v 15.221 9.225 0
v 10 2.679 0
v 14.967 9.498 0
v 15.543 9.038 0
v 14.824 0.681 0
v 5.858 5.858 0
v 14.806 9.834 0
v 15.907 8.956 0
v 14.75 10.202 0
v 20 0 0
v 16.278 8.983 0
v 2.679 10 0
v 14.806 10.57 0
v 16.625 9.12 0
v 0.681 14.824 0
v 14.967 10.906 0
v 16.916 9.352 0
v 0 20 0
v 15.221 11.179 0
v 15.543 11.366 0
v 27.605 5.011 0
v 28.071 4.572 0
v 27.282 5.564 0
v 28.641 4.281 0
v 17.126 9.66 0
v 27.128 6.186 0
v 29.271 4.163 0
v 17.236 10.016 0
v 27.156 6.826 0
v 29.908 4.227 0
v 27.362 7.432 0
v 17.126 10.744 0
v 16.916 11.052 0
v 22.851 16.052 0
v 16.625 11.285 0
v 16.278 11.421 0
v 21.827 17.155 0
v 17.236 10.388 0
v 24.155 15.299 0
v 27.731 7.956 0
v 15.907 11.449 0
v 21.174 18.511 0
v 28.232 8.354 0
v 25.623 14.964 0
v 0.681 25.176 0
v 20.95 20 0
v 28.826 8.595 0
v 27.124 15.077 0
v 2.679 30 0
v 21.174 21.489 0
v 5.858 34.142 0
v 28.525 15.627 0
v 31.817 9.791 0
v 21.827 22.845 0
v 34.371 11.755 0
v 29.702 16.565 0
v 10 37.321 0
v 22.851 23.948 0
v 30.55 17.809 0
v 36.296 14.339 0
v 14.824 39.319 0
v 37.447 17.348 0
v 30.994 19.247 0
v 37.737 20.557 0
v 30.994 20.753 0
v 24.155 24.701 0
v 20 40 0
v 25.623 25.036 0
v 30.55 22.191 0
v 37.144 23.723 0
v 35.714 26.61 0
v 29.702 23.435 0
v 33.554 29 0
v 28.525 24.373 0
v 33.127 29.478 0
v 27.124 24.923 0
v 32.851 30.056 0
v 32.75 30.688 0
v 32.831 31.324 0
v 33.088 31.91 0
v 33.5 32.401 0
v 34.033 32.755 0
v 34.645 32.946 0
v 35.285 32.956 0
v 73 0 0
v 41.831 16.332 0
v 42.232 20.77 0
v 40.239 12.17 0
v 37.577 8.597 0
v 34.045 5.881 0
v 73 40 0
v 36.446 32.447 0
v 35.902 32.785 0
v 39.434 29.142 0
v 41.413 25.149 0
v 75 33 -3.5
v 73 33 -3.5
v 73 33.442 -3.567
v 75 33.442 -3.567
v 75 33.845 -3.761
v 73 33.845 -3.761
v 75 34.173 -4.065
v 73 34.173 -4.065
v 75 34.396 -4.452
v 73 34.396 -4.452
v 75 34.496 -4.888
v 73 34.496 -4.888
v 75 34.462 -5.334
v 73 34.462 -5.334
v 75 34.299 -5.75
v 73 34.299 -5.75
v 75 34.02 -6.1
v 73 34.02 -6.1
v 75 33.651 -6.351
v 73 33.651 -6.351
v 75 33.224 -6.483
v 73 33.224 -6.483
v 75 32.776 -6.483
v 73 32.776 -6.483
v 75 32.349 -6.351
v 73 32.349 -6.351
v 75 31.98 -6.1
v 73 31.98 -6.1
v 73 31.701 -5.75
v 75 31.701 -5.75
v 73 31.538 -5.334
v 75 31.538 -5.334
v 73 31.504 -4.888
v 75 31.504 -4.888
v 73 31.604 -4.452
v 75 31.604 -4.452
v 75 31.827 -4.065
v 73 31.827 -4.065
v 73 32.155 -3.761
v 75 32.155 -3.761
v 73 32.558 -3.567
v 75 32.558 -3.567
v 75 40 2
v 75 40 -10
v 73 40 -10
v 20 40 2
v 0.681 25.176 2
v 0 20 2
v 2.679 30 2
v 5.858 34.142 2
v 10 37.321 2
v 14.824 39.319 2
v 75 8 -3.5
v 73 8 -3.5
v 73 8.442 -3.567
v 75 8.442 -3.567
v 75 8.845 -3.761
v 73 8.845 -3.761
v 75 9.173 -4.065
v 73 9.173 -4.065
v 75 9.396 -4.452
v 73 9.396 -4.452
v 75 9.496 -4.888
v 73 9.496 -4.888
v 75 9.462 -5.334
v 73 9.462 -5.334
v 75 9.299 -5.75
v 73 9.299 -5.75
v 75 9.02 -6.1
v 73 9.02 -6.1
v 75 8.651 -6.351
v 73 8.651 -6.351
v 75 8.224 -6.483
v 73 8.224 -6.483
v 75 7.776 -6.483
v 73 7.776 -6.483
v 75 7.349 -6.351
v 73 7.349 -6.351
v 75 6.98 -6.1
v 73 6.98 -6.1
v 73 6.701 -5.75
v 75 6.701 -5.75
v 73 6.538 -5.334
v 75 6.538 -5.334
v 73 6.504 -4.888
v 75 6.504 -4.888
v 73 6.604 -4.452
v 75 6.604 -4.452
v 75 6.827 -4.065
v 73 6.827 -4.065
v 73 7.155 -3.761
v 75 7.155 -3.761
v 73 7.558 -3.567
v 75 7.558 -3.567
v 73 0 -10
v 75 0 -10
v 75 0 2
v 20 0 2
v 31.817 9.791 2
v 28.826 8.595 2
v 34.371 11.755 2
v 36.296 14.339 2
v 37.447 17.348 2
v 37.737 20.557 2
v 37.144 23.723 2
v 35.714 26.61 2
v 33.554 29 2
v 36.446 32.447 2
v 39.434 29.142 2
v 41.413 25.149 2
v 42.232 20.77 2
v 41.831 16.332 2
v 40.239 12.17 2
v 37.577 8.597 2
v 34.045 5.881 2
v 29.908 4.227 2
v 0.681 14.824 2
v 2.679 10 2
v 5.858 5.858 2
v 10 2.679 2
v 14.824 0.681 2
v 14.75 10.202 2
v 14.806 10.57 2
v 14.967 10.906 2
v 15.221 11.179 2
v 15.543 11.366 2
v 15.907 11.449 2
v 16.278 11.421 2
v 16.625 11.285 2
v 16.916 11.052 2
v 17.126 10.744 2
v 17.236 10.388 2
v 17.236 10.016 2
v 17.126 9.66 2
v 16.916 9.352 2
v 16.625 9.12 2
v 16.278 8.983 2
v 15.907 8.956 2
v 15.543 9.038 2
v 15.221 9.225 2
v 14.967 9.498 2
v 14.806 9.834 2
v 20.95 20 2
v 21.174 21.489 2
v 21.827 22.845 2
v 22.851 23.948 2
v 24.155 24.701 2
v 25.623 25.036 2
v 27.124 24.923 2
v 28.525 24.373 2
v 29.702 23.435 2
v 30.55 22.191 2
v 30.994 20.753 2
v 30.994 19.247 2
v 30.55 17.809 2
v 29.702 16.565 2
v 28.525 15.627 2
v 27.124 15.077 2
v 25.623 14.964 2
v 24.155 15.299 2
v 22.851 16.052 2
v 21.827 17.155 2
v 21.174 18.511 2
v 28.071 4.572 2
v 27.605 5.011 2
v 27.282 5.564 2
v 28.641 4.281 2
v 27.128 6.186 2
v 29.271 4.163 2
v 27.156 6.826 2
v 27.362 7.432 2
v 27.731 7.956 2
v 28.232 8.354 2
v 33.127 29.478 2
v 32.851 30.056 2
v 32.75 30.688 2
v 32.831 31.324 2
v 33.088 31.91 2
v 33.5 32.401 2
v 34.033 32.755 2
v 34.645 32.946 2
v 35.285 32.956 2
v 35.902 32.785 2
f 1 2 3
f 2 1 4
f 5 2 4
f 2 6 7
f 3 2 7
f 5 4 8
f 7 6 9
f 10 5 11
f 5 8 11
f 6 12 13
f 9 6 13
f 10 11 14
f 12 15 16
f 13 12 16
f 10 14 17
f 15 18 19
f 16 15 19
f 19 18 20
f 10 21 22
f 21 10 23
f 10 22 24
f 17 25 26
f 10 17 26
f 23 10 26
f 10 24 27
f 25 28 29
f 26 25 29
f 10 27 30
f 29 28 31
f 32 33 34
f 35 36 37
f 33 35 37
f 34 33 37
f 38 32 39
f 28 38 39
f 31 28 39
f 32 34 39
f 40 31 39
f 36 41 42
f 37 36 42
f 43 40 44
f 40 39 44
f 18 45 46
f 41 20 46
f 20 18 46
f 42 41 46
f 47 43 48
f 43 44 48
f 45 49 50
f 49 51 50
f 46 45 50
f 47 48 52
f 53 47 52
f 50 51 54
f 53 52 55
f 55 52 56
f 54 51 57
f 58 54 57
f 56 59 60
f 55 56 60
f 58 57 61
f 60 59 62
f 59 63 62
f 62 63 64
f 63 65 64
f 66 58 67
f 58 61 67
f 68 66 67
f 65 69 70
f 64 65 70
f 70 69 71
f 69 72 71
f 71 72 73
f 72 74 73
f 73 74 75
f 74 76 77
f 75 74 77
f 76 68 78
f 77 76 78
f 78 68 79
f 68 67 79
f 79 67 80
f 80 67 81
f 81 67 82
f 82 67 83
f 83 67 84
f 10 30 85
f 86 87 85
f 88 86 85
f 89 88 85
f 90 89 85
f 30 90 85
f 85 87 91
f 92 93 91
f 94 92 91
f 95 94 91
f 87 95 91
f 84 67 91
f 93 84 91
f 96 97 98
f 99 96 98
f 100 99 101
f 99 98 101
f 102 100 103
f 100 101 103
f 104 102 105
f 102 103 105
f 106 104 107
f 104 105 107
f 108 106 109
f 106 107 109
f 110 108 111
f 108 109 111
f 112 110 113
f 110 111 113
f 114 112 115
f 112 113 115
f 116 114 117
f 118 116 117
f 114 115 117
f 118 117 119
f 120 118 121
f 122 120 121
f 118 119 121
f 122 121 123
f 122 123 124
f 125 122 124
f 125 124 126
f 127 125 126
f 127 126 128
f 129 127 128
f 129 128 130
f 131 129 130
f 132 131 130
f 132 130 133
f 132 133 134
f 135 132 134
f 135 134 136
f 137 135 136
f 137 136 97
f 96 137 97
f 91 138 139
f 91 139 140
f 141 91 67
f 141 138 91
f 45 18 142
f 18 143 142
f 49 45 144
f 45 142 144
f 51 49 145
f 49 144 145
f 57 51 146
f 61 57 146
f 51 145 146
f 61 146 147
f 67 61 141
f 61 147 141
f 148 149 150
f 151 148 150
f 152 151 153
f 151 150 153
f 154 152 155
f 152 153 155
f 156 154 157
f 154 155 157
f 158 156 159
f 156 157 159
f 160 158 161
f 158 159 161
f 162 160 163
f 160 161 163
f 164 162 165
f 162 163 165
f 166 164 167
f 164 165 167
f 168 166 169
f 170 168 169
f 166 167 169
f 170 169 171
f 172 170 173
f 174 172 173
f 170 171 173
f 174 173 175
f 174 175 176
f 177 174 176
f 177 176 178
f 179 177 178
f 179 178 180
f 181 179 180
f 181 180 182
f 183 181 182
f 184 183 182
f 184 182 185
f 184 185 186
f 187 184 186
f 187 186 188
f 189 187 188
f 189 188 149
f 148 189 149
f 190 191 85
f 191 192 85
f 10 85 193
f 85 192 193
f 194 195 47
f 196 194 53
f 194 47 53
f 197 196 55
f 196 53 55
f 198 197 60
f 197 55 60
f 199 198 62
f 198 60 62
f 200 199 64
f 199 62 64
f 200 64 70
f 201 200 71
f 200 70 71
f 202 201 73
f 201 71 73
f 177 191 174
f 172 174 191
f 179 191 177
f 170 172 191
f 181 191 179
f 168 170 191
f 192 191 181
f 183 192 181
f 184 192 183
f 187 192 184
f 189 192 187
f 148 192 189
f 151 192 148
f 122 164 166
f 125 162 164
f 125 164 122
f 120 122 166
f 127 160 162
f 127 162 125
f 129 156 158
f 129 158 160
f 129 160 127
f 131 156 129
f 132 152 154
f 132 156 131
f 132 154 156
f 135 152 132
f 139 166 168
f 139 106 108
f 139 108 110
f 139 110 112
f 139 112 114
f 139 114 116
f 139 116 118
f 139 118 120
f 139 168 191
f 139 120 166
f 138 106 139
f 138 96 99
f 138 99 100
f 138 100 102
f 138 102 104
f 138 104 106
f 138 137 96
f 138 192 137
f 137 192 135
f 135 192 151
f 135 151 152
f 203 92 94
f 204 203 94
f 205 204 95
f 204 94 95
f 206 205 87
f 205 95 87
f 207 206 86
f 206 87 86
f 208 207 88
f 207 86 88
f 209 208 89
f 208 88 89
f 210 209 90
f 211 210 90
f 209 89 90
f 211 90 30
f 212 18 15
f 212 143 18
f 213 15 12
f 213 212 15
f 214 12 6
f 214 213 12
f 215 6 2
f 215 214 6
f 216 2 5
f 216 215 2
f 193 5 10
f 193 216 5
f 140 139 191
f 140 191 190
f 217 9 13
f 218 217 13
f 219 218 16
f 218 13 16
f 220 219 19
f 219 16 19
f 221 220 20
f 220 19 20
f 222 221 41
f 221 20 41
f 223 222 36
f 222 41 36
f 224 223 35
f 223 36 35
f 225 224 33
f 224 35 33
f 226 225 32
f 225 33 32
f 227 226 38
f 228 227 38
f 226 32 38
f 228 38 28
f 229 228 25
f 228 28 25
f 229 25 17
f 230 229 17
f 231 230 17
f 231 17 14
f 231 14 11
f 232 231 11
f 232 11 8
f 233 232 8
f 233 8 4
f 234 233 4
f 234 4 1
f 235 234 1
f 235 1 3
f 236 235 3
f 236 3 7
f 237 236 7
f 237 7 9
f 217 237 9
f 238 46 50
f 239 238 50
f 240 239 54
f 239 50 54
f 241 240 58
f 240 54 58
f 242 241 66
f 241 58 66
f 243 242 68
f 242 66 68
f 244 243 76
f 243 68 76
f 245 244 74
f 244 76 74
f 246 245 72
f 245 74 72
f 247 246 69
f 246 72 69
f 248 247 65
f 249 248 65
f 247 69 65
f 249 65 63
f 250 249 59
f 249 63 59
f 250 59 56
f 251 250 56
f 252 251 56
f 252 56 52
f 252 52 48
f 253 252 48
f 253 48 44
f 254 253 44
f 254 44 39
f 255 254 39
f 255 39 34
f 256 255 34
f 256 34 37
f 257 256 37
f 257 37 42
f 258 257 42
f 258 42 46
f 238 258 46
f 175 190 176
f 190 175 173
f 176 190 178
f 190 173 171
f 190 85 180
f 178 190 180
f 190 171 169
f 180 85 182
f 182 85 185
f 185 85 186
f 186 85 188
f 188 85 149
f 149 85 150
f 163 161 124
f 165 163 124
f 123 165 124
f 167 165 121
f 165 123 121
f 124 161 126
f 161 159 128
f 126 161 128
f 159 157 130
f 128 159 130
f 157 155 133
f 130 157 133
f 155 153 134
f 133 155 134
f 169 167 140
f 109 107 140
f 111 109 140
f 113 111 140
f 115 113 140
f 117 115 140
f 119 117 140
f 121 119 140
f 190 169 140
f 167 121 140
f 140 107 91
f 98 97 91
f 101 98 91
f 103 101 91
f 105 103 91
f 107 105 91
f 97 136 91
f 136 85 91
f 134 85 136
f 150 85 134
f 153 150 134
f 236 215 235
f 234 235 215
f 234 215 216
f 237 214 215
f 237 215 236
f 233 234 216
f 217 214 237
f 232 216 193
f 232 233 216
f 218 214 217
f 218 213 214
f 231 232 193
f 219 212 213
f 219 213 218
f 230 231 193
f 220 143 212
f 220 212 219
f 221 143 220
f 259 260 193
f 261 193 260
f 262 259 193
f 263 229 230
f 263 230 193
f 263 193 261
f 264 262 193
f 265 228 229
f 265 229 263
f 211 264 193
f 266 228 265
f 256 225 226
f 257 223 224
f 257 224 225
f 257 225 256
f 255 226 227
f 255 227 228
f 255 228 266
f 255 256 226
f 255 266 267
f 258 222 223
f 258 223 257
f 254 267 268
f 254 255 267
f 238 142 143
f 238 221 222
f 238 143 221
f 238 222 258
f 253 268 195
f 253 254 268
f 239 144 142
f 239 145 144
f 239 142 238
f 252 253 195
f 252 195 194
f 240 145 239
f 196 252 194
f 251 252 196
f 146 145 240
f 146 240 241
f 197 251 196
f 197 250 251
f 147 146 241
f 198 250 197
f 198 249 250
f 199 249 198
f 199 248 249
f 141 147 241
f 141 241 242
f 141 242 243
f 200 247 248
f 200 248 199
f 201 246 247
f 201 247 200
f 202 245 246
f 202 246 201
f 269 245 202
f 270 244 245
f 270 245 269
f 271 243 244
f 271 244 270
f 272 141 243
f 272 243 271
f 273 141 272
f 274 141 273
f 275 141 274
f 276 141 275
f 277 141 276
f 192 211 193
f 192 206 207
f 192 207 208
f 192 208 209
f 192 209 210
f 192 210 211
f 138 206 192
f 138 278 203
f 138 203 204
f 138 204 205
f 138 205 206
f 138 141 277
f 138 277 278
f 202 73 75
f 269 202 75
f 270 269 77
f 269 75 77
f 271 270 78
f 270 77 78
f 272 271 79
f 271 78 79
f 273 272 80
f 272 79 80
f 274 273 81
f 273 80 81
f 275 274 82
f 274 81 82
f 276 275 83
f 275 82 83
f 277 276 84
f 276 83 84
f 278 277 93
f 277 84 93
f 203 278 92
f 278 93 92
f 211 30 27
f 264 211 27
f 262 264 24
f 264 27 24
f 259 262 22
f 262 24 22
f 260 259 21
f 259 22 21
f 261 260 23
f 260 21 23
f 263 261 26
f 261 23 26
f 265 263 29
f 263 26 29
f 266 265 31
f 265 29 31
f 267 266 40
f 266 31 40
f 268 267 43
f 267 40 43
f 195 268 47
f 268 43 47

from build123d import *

# Parameters (mm, degrees)
SKETCH_2_W          = 75
SKETCH_2_H          = 40
EXTRUDE_1_DEPTH     = 2
SKETCH_3_R          = 5.05
SKETCH_3_R_2        = 1.25
CUT_EXTRUDE_1_DEPTH = 86.023526156
FILLET_1_R          = 20
SKETCH_7_W          = 2
SKETCH_7_H          = 40
EXTRUDE_3_DEPTH     = 10
SKETCH_10_R         = 1.5
CUT_EXTRUDE_4_DEPTH = 84.839131675


with BuildPart() as part:
    # 草图2 → 凸台-拉伸1 (new body)
    with BuildSketch(Plane.XY):
        with Locations((37.5, 20)):
            Rectangle(SKETCH_2_W, SKETCH_2_H)
    extrude(amount=EXTRUDE_1_DEPTH)

    # 草图3 → 切除-拉伸1 (cut, through all)
    with BuildSketch(Plane(origin=(0, 0, 0), x_dir=(-1, 0, 0), z_dir=(0, 0, -1))):
        with Locations((-26, 20)):
            Circle(SKETCH_3_R)
        with Locations((-16, 10.202041029)):
            Circle(SKETCH_3_R_2)
        with BuildLine():
            ThreePointArc((-36.446428571, 32.447274003), (-41.830655455, 16.332187591), (-29.908043377, 4.226931276))
            ThreePointArc((-29.908043377, 4.226931276), (-27.182966317, 5.86978094), (-28.82581598, 8.594858))
            ThreePointArc((-28.82581598, 8.594858), (-37.446781637, 17.347889489), (-33.553571429, 29.000336587))
            ThreePointArc((-33.553571429, 29.000336587), (-33.276531292, 32.170233866), (-36.446428571, 32.447274003))
        make_face()
    extrude(amount=-CUT_EXTRUDE_1_DEPTH, mode=Mode.SUBTRACT)

    # 圆角1
    fillet_1_edges = [part.edges().sort_by_distance(p)[0] for p in [
        (0, 40, 1),
        (0, 0, 1),
    ]]
    fillet(fillet_1_edges, radius=FILLET_1_R - 0.0001)  # a hair under: the kernel refuses the full size

    # 草图7 → 凸台-拉伸3 (add)
    with BuildSketch(Plane(origin=(0, 0, 0), x_dir=(-1, 0, 0), z_dir=(0, 0, -1))):
        with Locations((-74, 20)):
            Rectangle(SKETCH_7_W, SKETCH_7_H)
    extrude(amount=EXTRUDE_3_DEPTH)

    # 草图10 → 切除-拉伸4 (cut, through all)
    with BuildSketch(Plane.ZY.offset(-73)):
        with Locations((-5, 33)):
            Circle(SKETCH_10_R)
        with Locations((-5, 8)):
            Circle(SKETCH_10_R)
    extrude(amount=-CUT_EXTRUDE_4_DEPTH, mode=Mode.SUBTRACT)


solid = part.part
